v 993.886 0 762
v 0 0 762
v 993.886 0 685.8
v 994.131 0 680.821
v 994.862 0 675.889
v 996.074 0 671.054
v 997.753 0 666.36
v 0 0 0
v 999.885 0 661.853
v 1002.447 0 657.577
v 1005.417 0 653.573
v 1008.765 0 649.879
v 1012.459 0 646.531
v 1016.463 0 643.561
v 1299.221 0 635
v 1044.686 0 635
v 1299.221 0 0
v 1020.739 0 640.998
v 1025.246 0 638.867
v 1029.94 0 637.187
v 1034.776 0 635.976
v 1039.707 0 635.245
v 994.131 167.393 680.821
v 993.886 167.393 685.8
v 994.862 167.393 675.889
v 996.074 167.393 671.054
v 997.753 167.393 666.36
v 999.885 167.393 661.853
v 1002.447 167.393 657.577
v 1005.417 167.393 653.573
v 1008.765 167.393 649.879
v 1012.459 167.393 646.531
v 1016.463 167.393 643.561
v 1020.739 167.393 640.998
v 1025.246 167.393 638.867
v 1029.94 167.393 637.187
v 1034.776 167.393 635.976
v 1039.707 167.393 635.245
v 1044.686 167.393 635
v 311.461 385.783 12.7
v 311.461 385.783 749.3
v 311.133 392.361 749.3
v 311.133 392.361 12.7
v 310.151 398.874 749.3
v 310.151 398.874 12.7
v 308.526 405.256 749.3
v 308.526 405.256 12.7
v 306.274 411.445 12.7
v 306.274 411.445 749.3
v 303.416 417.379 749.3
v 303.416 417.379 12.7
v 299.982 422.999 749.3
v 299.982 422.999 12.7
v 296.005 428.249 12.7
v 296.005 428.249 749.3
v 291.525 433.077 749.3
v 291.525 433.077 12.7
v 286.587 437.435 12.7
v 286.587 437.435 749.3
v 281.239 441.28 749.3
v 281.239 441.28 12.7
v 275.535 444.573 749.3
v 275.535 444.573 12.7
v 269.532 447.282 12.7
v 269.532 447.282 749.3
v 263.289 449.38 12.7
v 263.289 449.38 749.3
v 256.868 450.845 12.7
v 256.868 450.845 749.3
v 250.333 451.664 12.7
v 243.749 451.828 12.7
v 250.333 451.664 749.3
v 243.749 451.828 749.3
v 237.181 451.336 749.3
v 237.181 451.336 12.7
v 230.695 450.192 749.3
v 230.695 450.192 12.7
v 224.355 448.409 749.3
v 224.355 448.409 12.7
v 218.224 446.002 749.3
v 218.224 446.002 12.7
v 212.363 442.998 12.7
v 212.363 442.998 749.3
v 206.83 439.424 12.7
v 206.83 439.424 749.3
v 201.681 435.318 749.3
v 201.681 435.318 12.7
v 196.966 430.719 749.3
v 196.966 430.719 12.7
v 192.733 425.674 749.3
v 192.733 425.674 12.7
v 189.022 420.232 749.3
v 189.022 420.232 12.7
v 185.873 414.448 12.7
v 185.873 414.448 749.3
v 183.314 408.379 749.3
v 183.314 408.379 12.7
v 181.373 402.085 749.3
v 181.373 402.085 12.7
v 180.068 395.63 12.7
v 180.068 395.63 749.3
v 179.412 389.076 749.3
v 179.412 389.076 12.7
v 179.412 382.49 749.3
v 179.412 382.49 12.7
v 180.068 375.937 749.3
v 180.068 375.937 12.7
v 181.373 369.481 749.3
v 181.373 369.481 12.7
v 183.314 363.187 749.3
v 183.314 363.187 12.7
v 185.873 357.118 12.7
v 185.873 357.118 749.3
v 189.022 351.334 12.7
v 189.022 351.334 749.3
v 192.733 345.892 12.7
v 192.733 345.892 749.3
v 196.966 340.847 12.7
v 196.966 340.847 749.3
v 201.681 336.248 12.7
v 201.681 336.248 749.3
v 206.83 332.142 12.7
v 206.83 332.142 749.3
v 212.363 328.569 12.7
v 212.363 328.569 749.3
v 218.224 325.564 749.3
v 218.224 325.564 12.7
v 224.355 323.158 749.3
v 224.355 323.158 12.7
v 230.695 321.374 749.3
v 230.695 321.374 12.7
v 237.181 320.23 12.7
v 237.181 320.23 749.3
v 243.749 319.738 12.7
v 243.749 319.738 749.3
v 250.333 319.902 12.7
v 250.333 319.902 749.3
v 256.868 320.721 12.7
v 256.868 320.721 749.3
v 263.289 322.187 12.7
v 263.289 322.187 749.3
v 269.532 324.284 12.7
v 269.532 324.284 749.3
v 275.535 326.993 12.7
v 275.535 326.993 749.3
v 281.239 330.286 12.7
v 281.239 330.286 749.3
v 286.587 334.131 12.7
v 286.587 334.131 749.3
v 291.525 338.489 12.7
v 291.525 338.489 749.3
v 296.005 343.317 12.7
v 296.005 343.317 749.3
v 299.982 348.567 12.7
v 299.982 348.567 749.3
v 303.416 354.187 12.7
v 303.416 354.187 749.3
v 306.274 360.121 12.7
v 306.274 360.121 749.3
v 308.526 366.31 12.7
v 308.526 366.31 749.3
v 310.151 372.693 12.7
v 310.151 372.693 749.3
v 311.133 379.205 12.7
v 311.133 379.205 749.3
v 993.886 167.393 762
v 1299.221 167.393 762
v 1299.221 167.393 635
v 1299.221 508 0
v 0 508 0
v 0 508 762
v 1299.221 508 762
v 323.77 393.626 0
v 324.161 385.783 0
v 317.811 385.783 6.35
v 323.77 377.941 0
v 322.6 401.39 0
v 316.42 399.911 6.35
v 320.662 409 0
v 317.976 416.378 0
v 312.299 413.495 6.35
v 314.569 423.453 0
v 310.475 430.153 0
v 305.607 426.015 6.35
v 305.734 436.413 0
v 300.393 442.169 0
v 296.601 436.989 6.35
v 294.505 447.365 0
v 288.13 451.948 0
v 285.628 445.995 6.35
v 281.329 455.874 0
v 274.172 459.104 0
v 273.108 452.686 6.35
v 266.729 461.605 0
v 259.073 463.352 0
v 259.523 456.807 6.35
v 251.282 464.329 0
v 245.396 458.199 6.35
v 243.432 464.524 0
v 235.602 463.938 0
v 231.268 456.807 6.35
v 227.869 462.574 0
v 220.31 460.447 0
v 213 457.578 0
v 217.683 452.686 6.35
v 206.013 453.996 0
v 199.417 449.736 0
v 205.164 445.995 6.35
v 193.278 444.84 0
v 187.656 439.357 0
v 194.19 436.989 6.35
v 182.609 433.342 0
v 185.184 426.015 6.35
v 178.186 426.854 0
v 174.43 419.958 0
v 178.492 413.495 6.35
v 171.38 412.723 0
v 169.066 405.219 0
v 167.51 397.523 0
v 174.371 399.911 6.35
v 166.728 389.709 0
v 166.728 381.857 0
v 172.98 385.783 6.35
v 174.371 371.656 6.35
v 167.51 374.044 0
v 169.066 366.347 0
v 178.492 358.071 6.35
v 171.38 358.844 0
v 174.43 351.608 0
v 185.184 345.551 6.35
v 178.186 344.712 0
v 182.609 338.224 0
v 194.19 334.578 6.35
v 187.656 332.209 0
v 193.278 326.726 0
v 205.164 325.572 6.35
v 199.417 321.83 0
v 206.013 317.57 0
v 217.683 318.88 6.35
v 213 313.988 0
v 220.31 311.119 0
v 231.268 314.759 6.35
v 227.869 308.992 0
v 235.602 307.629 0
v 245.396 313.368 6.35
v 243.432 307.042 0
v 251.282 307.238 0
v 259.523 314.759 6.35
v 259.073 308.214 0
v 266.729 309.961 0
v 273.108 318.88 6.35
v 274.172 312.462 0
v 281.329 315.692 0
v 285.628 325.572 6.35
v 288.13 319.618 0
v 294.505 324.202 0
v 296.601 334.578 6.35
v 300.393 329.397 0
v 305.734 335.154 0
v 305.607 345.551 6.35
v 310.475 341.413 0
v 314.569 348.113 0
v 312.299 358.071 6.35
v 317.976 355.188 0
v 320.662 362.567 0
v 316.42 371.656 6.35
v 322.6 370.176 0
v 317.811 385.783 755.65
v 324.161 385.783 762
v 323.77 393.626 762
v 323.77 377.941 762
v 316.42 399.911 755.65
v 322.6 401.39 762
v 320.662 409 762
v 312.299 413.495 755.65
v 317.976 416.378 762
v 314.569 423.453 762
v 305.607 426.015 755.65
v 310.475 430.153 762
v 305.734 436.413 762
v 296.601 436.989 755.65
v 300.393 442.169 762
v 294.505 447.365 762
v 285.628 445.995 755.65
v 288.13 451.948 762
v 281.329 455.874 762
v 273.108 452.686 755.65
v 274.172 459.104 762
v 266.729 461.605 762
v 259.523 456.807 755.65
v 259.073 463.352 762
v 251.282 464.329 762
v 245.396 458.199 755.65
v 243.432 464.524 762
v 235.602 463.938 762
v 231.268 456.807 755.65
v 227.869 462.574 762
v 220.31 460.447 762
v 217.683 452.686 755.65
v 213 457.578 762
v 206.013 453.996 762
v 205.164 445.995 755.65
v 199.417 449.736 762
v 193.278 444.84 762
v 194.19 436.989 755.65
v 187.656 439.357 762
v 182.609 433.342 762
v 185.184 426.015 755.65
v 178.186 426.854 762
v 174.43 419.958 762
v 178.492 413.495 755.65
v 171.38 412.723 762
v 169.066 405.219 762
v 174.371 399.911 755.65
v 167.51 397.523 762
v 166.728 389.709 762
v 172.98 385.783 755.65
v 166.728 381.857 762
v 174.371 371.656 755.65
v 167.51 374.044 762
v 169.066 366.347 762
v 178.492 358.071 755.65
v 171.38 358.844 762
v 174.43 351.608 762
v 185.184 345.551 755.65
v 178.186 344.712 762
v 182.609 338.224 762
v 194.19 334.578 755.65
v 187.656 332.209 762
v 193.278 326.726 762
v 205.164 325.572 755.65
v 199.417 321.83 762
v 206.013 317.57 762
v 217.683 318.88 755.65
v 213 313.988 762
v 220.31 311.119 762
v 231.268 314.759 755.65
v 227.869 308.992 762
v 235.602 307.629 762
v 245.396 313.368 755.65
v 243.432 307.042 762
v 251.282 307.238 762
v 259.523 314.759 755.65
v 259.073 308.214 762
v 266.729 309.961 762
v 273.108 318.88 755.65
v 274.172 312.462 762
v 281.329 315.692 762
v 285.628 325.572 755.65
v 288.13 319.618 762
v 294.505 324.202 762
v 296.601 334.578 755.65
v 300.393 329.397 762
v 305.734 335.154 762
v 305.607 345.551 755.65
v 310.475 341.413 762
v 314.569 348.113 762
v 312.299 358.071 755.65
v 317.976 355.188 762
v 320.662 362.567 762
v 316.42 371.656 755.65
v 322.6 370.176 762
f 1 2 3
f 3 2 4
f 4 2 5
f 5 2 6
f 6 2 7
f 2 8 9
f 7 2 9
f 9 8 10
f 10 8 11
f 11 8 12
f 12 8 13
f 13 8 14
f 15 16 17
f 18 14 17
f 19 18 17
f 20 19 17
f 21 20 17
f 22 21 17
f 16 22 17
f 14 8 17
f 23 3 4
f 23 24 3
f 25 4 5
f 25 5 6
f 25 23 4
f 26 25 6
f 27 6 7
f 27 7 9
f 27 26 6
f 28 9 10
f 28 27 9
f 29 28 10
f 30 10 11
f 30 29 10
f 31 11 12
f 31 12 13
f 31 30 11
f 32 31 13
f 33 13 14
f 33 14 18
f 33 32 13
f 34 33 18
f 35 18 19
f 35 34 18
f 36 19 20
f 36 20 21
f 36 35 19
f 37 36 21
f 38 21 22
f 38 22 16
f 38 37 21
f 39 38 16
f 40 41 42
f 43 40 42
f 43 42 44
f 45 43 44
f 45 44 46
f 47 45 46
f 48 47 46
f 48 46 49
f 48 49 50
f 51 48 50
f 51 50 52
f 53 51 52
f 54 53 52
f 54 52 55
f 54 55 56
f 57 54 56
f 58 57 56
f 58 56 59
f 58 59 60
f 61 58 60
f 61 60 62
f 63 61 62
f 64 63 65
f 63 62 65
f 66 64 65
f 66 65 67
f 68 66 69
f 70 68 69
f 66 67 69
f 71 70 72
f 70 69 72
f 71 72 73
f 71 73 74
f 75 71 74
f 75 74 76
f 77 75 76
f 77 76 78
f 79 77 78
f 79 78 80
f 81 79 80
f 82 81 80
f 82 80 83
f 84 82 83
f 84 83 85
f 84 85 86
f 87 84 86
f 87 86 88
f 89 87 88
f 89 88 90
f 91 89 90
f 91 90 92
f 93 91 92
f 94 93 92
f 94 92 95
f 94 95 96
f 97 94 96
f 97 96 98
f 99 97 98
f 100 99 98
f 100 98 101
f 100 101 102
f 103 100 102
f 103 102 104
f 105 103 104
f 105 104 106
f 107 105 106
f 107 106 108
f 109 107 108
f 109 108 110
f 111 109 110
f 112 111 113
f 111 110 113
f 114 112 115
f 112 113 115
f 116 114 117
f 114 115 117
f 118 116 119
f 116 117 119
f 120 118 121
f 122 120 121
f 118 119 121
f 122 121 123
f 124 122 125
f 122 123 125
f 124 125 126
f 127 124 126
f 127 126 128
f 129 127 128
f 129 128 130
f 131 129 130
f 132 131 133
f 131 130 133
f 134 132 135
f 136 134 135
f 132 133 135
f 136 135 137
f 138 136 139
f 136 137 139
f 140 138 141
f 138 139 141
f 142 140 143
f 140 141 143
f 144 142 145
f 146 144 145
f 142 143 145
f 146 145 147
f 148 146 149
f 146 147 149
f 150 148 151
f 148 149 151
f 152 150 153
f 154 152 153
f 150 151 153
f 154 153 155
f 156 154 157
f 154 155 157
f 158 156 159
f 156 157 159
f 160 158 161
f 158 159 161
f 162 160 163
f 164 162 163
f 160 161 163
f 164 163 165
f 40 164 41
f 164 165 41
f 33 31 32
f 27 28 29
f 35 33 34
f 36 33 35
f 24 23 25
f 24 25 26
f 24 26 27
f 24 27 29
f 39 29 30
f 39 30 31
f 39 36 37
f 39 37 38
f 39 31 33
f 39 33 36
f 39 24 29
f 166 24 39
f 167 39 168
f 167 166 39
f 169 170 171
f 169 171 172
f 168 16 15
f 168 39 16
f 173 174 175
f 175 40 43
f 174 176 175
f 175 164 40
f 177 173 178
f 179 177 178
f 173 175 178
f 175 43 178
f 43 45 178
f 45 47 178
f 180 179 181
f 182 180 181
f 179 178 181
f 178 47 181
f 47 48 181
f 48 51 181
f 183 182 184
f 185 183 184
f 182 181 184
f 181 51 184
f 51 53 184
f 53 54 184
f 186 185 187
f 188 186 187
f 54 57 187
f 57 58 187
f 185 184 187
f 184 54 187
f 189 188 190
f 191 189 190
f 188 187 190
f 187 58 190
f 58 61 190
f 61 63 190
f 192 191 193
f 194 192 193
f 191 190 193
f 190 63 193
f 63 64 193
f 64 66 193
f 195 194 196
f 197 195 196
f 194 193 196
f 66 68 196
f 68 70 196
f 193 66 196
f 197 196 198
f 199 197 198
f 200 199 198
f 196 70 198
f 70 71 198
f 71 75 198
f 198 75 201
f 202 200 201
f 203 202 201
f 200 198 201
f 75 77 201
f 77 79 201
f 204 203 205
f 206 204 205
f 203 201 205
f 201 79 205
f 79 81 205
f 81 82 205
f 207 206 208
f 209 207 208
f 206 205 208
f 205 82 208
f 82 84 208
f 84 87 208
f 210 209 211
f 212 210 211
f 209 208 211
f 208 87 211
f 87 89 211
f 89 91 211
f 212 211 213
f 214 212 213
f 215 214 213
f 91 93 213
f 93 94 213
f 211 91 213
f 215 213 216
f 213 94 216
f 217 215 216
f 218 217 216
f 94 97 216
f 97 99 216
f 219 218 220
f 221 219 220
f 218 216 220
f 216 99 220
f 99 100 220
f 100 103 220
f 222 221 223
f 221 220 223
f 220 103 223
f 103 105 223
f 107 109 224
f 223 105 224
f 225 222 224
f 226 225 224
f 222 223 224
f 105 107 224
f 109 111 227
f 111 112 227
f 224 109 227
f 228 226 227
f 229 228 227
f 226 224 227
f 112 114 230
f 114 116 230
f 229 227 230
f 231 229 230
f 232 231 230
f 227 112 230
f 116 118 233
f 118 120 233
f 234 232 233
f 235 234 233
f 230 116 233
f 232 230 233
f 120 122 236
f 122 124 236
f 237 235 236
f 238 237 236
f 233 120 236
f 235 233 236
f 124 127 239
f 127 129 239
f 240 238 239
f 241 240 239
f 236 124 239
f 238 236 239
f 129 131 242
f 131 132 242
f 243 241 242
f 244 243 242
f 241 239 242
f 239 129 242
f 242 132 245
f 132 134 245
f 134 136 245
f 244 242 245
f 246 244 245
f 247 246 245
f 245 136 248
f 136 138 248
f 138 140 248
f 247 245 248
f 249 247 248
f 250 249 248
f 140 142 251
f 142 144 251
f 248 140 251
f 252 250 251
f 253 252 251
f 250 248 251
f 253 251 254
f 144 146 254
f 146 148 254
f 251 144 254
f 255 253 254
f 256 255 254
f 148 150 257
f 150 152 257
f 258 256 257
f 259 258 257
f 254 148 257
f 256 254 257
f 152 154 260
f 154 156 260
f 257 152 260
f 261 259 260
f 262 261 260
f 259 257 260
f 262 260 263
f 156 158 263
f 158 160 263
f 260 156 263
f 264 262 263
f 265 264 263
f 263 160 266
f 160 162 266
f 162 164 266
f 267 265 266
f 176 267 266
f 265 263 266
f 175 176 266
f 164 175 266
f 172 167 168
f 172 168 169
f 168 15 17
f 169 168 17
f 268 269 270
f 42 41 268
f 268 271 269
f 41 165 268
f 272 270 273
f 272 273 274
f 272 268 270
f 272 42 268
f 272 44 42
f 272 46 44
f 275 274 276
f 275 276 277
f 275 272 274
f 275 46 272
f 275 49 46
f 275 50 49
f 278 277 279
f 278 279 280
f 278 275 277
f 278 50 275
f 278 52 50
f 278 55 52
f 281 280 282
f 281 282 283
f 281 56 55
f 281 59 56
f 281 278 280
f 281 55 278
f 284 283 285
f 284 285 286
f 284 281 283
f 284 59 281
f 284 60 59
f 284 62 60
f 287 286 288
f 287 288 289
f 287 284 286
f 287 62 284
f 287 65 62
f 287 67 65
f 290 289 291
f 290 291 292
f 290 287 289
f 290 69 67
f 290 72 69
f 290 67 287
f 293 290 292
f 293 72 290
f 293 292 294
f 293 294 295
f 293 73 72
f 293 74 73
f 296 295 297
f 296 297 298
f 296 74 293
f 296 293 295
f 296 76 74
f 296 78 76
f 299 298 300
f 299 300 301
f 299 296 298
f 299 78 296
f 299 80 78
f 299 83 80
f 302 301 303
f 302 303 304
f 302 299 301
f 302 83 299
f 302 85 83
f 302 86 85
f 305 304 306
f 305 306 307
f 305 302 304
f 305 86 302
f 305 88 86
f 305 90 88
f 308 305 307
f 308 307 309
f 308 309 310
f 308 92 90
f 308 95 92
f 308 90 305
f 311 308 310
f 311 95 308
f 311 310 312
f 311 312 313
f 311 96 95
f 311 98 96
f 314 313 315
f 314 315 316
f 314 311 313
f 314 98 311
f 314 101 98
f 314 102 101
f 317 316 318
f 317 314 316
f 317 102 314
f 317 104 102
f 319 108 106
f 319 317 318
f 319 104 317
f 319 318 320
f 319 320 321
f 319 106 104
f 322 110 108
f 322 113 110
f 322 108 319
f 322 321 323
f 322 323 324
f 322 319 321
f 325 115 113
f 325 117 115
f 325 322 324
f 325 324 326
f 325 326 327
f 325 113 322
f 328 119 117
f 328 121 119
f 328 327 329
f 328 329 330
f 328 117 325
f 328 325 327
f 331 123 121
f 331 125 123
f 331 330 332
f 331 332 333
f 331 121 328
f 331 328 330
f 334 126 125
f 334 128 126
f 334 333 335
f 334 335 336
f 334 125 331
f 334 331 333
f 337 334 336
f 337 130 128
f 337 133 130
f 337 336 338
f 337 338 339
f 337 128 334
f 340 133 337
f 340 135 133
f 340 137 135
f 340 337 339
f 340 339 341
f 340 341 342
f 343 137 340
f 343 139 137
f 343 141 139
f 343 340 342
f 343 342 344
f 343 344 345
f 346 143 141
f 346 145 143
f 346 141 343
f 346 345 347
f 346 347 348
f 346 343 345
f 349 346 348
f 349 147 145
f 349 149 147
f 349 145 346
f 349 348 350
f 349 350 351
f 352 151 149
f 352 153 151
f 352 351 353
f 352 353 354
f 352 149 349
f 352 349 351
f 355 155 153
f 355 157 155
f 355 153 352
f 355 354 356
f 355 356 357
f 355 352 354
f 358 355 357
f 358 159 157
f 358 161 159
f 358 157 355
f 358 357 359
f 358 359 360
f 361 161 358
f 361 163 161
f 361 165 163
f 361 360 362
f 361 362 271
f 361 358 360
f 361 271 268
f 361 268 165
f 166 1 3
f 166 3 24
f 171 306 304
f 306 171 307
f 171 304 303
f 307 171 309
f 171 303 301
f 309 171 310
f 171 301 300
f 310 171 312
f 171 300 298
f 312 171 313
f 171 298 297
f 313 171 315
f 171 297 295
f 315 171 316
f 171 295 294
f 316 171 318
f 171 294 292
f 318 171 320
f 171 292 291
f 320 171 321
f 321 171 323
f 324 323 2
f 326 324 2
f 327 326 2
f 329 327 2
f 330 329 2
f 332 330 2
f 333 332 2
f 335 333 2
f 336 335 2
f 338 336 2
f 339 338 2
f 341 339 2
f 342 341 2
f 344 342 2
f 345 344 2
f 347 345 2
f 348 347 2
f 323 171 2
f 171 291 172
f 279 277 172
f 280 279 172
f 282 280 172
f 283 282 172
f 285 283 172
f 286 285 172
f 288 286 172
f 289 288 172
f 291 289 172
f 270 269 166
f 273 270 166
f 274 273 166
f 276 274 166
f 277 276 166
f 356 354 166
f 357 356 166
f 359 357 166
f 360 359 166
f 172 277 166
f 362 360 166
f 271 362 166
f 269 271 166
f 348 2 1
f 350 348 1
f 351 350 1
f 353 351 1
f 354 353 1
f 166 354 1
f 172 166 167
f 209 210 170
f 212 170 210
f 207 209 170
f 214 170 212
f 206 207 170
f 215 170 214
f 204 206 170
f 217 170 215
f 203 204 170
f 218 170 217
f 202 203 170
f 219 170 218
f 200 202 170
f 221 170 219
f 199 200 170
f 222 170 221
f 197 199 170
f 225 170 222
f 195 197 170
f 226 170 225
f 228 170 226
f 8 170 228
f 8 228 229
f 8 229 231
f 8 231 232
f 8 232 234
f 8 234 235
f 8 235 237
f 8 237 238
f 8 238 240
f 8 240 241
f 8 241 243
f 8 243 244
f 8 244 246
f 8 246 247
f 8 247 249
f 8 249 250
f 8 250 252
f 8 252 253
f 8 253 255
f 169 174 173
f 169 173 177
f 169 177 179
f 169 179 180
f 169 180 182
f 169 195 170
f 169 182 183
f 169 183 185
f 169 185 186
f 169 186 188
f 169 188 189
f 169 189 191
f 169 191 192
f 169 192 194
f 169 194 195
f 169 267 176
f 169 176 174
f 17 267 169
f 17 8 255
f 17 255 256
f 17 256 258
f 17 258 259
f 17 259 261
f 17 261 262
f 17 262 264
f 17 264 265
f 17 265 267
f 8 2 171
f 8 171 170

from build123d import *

# Parameters (mm, degrees)
SKETCH1_W           = 1299.221386713
SKETCH1_H           = 762
BOSS_EXTRUDE2_DEPTH = 508
SKETCH3_R           = 90.110640619
BOSS_EXTRUDE4_DEPTH = 762
SKETCH4_R           = 66.065626011
CUT_EXTRUDE1_DEPTH  = 1590.554721201
CHAMFER3_SIZE       = 12.7
SKETCH5_W           = 305.335237322
SKETCH5_H           = 167.392745924
CUT_EXTRUDE2_DEPTH  = 127
FILLET3_R           = 50.8


with BuildPart() as part:
    # Sketch1 → Boss-Extrude2 (new body)
    with BuildSketch(Plane(origin=(0, 0, 0), x_dir=(1, 0, 0), z_dir=(0, 1, 0))):
        with Locations((649.610693357, -381)):
            Rectangle(SKETCH1_W, SKETCH1_H)
    extrude(amount=BOSS_EXTRUDE2_DEPTH)

    # Sketch3 → Boss-Extrude4 (add, through all)
    with BuildSketch(Plane.XY.offset(762)):
        with Locations((199.400638449, 376.804670273)):
            Circle(SKETCH3_R)
    extrude(amount=-BOSS_EXTRUDE4_DEPTH)

    # Sketch4 → Cut-Extrude1 (cut, through all)
    with BuildSketch(Plane.XY.offset(762)):
        with Locations((245.395602091, 385.783170349)):
            Circle(SKETCH4_R)
    extrude(amount=-CUT_EXTRUDE1_DEPTH, mode=Mode.SUBTRACT)

    # Chamfer3
    chamfer3_edges = [part.edges().sort_by_distance(p)[0] for p in [
        (179.329976081, 385.783170349, 0),
        (179.329976081, 385.783170349, 762),
    ]]
    chamfer(chamfer3_edges, length=CHAMFER3_SIZE)

    # Sketch5 → Cut-Extrude2 (cut)
    with BuildSketch(Plane.XY.offset(762)):
        with Locations((1146.553768052, 83.696372962)):
            Rectangle(SKETCH5_W, SKETCH5_H)
    extrude(amount=-CUT_EXTRUDE2_DEPTH, mode=Mode.SUBTRACT)

    # Fillet3
    fillet3_edges = [part.edges().sort_by_distance(p)[0] for p in [
        (993.886149391, 83.696372962, 635),
    ]]
    fillet(fillet3_edges, radius=FILLET3_R)


solid = part.part
